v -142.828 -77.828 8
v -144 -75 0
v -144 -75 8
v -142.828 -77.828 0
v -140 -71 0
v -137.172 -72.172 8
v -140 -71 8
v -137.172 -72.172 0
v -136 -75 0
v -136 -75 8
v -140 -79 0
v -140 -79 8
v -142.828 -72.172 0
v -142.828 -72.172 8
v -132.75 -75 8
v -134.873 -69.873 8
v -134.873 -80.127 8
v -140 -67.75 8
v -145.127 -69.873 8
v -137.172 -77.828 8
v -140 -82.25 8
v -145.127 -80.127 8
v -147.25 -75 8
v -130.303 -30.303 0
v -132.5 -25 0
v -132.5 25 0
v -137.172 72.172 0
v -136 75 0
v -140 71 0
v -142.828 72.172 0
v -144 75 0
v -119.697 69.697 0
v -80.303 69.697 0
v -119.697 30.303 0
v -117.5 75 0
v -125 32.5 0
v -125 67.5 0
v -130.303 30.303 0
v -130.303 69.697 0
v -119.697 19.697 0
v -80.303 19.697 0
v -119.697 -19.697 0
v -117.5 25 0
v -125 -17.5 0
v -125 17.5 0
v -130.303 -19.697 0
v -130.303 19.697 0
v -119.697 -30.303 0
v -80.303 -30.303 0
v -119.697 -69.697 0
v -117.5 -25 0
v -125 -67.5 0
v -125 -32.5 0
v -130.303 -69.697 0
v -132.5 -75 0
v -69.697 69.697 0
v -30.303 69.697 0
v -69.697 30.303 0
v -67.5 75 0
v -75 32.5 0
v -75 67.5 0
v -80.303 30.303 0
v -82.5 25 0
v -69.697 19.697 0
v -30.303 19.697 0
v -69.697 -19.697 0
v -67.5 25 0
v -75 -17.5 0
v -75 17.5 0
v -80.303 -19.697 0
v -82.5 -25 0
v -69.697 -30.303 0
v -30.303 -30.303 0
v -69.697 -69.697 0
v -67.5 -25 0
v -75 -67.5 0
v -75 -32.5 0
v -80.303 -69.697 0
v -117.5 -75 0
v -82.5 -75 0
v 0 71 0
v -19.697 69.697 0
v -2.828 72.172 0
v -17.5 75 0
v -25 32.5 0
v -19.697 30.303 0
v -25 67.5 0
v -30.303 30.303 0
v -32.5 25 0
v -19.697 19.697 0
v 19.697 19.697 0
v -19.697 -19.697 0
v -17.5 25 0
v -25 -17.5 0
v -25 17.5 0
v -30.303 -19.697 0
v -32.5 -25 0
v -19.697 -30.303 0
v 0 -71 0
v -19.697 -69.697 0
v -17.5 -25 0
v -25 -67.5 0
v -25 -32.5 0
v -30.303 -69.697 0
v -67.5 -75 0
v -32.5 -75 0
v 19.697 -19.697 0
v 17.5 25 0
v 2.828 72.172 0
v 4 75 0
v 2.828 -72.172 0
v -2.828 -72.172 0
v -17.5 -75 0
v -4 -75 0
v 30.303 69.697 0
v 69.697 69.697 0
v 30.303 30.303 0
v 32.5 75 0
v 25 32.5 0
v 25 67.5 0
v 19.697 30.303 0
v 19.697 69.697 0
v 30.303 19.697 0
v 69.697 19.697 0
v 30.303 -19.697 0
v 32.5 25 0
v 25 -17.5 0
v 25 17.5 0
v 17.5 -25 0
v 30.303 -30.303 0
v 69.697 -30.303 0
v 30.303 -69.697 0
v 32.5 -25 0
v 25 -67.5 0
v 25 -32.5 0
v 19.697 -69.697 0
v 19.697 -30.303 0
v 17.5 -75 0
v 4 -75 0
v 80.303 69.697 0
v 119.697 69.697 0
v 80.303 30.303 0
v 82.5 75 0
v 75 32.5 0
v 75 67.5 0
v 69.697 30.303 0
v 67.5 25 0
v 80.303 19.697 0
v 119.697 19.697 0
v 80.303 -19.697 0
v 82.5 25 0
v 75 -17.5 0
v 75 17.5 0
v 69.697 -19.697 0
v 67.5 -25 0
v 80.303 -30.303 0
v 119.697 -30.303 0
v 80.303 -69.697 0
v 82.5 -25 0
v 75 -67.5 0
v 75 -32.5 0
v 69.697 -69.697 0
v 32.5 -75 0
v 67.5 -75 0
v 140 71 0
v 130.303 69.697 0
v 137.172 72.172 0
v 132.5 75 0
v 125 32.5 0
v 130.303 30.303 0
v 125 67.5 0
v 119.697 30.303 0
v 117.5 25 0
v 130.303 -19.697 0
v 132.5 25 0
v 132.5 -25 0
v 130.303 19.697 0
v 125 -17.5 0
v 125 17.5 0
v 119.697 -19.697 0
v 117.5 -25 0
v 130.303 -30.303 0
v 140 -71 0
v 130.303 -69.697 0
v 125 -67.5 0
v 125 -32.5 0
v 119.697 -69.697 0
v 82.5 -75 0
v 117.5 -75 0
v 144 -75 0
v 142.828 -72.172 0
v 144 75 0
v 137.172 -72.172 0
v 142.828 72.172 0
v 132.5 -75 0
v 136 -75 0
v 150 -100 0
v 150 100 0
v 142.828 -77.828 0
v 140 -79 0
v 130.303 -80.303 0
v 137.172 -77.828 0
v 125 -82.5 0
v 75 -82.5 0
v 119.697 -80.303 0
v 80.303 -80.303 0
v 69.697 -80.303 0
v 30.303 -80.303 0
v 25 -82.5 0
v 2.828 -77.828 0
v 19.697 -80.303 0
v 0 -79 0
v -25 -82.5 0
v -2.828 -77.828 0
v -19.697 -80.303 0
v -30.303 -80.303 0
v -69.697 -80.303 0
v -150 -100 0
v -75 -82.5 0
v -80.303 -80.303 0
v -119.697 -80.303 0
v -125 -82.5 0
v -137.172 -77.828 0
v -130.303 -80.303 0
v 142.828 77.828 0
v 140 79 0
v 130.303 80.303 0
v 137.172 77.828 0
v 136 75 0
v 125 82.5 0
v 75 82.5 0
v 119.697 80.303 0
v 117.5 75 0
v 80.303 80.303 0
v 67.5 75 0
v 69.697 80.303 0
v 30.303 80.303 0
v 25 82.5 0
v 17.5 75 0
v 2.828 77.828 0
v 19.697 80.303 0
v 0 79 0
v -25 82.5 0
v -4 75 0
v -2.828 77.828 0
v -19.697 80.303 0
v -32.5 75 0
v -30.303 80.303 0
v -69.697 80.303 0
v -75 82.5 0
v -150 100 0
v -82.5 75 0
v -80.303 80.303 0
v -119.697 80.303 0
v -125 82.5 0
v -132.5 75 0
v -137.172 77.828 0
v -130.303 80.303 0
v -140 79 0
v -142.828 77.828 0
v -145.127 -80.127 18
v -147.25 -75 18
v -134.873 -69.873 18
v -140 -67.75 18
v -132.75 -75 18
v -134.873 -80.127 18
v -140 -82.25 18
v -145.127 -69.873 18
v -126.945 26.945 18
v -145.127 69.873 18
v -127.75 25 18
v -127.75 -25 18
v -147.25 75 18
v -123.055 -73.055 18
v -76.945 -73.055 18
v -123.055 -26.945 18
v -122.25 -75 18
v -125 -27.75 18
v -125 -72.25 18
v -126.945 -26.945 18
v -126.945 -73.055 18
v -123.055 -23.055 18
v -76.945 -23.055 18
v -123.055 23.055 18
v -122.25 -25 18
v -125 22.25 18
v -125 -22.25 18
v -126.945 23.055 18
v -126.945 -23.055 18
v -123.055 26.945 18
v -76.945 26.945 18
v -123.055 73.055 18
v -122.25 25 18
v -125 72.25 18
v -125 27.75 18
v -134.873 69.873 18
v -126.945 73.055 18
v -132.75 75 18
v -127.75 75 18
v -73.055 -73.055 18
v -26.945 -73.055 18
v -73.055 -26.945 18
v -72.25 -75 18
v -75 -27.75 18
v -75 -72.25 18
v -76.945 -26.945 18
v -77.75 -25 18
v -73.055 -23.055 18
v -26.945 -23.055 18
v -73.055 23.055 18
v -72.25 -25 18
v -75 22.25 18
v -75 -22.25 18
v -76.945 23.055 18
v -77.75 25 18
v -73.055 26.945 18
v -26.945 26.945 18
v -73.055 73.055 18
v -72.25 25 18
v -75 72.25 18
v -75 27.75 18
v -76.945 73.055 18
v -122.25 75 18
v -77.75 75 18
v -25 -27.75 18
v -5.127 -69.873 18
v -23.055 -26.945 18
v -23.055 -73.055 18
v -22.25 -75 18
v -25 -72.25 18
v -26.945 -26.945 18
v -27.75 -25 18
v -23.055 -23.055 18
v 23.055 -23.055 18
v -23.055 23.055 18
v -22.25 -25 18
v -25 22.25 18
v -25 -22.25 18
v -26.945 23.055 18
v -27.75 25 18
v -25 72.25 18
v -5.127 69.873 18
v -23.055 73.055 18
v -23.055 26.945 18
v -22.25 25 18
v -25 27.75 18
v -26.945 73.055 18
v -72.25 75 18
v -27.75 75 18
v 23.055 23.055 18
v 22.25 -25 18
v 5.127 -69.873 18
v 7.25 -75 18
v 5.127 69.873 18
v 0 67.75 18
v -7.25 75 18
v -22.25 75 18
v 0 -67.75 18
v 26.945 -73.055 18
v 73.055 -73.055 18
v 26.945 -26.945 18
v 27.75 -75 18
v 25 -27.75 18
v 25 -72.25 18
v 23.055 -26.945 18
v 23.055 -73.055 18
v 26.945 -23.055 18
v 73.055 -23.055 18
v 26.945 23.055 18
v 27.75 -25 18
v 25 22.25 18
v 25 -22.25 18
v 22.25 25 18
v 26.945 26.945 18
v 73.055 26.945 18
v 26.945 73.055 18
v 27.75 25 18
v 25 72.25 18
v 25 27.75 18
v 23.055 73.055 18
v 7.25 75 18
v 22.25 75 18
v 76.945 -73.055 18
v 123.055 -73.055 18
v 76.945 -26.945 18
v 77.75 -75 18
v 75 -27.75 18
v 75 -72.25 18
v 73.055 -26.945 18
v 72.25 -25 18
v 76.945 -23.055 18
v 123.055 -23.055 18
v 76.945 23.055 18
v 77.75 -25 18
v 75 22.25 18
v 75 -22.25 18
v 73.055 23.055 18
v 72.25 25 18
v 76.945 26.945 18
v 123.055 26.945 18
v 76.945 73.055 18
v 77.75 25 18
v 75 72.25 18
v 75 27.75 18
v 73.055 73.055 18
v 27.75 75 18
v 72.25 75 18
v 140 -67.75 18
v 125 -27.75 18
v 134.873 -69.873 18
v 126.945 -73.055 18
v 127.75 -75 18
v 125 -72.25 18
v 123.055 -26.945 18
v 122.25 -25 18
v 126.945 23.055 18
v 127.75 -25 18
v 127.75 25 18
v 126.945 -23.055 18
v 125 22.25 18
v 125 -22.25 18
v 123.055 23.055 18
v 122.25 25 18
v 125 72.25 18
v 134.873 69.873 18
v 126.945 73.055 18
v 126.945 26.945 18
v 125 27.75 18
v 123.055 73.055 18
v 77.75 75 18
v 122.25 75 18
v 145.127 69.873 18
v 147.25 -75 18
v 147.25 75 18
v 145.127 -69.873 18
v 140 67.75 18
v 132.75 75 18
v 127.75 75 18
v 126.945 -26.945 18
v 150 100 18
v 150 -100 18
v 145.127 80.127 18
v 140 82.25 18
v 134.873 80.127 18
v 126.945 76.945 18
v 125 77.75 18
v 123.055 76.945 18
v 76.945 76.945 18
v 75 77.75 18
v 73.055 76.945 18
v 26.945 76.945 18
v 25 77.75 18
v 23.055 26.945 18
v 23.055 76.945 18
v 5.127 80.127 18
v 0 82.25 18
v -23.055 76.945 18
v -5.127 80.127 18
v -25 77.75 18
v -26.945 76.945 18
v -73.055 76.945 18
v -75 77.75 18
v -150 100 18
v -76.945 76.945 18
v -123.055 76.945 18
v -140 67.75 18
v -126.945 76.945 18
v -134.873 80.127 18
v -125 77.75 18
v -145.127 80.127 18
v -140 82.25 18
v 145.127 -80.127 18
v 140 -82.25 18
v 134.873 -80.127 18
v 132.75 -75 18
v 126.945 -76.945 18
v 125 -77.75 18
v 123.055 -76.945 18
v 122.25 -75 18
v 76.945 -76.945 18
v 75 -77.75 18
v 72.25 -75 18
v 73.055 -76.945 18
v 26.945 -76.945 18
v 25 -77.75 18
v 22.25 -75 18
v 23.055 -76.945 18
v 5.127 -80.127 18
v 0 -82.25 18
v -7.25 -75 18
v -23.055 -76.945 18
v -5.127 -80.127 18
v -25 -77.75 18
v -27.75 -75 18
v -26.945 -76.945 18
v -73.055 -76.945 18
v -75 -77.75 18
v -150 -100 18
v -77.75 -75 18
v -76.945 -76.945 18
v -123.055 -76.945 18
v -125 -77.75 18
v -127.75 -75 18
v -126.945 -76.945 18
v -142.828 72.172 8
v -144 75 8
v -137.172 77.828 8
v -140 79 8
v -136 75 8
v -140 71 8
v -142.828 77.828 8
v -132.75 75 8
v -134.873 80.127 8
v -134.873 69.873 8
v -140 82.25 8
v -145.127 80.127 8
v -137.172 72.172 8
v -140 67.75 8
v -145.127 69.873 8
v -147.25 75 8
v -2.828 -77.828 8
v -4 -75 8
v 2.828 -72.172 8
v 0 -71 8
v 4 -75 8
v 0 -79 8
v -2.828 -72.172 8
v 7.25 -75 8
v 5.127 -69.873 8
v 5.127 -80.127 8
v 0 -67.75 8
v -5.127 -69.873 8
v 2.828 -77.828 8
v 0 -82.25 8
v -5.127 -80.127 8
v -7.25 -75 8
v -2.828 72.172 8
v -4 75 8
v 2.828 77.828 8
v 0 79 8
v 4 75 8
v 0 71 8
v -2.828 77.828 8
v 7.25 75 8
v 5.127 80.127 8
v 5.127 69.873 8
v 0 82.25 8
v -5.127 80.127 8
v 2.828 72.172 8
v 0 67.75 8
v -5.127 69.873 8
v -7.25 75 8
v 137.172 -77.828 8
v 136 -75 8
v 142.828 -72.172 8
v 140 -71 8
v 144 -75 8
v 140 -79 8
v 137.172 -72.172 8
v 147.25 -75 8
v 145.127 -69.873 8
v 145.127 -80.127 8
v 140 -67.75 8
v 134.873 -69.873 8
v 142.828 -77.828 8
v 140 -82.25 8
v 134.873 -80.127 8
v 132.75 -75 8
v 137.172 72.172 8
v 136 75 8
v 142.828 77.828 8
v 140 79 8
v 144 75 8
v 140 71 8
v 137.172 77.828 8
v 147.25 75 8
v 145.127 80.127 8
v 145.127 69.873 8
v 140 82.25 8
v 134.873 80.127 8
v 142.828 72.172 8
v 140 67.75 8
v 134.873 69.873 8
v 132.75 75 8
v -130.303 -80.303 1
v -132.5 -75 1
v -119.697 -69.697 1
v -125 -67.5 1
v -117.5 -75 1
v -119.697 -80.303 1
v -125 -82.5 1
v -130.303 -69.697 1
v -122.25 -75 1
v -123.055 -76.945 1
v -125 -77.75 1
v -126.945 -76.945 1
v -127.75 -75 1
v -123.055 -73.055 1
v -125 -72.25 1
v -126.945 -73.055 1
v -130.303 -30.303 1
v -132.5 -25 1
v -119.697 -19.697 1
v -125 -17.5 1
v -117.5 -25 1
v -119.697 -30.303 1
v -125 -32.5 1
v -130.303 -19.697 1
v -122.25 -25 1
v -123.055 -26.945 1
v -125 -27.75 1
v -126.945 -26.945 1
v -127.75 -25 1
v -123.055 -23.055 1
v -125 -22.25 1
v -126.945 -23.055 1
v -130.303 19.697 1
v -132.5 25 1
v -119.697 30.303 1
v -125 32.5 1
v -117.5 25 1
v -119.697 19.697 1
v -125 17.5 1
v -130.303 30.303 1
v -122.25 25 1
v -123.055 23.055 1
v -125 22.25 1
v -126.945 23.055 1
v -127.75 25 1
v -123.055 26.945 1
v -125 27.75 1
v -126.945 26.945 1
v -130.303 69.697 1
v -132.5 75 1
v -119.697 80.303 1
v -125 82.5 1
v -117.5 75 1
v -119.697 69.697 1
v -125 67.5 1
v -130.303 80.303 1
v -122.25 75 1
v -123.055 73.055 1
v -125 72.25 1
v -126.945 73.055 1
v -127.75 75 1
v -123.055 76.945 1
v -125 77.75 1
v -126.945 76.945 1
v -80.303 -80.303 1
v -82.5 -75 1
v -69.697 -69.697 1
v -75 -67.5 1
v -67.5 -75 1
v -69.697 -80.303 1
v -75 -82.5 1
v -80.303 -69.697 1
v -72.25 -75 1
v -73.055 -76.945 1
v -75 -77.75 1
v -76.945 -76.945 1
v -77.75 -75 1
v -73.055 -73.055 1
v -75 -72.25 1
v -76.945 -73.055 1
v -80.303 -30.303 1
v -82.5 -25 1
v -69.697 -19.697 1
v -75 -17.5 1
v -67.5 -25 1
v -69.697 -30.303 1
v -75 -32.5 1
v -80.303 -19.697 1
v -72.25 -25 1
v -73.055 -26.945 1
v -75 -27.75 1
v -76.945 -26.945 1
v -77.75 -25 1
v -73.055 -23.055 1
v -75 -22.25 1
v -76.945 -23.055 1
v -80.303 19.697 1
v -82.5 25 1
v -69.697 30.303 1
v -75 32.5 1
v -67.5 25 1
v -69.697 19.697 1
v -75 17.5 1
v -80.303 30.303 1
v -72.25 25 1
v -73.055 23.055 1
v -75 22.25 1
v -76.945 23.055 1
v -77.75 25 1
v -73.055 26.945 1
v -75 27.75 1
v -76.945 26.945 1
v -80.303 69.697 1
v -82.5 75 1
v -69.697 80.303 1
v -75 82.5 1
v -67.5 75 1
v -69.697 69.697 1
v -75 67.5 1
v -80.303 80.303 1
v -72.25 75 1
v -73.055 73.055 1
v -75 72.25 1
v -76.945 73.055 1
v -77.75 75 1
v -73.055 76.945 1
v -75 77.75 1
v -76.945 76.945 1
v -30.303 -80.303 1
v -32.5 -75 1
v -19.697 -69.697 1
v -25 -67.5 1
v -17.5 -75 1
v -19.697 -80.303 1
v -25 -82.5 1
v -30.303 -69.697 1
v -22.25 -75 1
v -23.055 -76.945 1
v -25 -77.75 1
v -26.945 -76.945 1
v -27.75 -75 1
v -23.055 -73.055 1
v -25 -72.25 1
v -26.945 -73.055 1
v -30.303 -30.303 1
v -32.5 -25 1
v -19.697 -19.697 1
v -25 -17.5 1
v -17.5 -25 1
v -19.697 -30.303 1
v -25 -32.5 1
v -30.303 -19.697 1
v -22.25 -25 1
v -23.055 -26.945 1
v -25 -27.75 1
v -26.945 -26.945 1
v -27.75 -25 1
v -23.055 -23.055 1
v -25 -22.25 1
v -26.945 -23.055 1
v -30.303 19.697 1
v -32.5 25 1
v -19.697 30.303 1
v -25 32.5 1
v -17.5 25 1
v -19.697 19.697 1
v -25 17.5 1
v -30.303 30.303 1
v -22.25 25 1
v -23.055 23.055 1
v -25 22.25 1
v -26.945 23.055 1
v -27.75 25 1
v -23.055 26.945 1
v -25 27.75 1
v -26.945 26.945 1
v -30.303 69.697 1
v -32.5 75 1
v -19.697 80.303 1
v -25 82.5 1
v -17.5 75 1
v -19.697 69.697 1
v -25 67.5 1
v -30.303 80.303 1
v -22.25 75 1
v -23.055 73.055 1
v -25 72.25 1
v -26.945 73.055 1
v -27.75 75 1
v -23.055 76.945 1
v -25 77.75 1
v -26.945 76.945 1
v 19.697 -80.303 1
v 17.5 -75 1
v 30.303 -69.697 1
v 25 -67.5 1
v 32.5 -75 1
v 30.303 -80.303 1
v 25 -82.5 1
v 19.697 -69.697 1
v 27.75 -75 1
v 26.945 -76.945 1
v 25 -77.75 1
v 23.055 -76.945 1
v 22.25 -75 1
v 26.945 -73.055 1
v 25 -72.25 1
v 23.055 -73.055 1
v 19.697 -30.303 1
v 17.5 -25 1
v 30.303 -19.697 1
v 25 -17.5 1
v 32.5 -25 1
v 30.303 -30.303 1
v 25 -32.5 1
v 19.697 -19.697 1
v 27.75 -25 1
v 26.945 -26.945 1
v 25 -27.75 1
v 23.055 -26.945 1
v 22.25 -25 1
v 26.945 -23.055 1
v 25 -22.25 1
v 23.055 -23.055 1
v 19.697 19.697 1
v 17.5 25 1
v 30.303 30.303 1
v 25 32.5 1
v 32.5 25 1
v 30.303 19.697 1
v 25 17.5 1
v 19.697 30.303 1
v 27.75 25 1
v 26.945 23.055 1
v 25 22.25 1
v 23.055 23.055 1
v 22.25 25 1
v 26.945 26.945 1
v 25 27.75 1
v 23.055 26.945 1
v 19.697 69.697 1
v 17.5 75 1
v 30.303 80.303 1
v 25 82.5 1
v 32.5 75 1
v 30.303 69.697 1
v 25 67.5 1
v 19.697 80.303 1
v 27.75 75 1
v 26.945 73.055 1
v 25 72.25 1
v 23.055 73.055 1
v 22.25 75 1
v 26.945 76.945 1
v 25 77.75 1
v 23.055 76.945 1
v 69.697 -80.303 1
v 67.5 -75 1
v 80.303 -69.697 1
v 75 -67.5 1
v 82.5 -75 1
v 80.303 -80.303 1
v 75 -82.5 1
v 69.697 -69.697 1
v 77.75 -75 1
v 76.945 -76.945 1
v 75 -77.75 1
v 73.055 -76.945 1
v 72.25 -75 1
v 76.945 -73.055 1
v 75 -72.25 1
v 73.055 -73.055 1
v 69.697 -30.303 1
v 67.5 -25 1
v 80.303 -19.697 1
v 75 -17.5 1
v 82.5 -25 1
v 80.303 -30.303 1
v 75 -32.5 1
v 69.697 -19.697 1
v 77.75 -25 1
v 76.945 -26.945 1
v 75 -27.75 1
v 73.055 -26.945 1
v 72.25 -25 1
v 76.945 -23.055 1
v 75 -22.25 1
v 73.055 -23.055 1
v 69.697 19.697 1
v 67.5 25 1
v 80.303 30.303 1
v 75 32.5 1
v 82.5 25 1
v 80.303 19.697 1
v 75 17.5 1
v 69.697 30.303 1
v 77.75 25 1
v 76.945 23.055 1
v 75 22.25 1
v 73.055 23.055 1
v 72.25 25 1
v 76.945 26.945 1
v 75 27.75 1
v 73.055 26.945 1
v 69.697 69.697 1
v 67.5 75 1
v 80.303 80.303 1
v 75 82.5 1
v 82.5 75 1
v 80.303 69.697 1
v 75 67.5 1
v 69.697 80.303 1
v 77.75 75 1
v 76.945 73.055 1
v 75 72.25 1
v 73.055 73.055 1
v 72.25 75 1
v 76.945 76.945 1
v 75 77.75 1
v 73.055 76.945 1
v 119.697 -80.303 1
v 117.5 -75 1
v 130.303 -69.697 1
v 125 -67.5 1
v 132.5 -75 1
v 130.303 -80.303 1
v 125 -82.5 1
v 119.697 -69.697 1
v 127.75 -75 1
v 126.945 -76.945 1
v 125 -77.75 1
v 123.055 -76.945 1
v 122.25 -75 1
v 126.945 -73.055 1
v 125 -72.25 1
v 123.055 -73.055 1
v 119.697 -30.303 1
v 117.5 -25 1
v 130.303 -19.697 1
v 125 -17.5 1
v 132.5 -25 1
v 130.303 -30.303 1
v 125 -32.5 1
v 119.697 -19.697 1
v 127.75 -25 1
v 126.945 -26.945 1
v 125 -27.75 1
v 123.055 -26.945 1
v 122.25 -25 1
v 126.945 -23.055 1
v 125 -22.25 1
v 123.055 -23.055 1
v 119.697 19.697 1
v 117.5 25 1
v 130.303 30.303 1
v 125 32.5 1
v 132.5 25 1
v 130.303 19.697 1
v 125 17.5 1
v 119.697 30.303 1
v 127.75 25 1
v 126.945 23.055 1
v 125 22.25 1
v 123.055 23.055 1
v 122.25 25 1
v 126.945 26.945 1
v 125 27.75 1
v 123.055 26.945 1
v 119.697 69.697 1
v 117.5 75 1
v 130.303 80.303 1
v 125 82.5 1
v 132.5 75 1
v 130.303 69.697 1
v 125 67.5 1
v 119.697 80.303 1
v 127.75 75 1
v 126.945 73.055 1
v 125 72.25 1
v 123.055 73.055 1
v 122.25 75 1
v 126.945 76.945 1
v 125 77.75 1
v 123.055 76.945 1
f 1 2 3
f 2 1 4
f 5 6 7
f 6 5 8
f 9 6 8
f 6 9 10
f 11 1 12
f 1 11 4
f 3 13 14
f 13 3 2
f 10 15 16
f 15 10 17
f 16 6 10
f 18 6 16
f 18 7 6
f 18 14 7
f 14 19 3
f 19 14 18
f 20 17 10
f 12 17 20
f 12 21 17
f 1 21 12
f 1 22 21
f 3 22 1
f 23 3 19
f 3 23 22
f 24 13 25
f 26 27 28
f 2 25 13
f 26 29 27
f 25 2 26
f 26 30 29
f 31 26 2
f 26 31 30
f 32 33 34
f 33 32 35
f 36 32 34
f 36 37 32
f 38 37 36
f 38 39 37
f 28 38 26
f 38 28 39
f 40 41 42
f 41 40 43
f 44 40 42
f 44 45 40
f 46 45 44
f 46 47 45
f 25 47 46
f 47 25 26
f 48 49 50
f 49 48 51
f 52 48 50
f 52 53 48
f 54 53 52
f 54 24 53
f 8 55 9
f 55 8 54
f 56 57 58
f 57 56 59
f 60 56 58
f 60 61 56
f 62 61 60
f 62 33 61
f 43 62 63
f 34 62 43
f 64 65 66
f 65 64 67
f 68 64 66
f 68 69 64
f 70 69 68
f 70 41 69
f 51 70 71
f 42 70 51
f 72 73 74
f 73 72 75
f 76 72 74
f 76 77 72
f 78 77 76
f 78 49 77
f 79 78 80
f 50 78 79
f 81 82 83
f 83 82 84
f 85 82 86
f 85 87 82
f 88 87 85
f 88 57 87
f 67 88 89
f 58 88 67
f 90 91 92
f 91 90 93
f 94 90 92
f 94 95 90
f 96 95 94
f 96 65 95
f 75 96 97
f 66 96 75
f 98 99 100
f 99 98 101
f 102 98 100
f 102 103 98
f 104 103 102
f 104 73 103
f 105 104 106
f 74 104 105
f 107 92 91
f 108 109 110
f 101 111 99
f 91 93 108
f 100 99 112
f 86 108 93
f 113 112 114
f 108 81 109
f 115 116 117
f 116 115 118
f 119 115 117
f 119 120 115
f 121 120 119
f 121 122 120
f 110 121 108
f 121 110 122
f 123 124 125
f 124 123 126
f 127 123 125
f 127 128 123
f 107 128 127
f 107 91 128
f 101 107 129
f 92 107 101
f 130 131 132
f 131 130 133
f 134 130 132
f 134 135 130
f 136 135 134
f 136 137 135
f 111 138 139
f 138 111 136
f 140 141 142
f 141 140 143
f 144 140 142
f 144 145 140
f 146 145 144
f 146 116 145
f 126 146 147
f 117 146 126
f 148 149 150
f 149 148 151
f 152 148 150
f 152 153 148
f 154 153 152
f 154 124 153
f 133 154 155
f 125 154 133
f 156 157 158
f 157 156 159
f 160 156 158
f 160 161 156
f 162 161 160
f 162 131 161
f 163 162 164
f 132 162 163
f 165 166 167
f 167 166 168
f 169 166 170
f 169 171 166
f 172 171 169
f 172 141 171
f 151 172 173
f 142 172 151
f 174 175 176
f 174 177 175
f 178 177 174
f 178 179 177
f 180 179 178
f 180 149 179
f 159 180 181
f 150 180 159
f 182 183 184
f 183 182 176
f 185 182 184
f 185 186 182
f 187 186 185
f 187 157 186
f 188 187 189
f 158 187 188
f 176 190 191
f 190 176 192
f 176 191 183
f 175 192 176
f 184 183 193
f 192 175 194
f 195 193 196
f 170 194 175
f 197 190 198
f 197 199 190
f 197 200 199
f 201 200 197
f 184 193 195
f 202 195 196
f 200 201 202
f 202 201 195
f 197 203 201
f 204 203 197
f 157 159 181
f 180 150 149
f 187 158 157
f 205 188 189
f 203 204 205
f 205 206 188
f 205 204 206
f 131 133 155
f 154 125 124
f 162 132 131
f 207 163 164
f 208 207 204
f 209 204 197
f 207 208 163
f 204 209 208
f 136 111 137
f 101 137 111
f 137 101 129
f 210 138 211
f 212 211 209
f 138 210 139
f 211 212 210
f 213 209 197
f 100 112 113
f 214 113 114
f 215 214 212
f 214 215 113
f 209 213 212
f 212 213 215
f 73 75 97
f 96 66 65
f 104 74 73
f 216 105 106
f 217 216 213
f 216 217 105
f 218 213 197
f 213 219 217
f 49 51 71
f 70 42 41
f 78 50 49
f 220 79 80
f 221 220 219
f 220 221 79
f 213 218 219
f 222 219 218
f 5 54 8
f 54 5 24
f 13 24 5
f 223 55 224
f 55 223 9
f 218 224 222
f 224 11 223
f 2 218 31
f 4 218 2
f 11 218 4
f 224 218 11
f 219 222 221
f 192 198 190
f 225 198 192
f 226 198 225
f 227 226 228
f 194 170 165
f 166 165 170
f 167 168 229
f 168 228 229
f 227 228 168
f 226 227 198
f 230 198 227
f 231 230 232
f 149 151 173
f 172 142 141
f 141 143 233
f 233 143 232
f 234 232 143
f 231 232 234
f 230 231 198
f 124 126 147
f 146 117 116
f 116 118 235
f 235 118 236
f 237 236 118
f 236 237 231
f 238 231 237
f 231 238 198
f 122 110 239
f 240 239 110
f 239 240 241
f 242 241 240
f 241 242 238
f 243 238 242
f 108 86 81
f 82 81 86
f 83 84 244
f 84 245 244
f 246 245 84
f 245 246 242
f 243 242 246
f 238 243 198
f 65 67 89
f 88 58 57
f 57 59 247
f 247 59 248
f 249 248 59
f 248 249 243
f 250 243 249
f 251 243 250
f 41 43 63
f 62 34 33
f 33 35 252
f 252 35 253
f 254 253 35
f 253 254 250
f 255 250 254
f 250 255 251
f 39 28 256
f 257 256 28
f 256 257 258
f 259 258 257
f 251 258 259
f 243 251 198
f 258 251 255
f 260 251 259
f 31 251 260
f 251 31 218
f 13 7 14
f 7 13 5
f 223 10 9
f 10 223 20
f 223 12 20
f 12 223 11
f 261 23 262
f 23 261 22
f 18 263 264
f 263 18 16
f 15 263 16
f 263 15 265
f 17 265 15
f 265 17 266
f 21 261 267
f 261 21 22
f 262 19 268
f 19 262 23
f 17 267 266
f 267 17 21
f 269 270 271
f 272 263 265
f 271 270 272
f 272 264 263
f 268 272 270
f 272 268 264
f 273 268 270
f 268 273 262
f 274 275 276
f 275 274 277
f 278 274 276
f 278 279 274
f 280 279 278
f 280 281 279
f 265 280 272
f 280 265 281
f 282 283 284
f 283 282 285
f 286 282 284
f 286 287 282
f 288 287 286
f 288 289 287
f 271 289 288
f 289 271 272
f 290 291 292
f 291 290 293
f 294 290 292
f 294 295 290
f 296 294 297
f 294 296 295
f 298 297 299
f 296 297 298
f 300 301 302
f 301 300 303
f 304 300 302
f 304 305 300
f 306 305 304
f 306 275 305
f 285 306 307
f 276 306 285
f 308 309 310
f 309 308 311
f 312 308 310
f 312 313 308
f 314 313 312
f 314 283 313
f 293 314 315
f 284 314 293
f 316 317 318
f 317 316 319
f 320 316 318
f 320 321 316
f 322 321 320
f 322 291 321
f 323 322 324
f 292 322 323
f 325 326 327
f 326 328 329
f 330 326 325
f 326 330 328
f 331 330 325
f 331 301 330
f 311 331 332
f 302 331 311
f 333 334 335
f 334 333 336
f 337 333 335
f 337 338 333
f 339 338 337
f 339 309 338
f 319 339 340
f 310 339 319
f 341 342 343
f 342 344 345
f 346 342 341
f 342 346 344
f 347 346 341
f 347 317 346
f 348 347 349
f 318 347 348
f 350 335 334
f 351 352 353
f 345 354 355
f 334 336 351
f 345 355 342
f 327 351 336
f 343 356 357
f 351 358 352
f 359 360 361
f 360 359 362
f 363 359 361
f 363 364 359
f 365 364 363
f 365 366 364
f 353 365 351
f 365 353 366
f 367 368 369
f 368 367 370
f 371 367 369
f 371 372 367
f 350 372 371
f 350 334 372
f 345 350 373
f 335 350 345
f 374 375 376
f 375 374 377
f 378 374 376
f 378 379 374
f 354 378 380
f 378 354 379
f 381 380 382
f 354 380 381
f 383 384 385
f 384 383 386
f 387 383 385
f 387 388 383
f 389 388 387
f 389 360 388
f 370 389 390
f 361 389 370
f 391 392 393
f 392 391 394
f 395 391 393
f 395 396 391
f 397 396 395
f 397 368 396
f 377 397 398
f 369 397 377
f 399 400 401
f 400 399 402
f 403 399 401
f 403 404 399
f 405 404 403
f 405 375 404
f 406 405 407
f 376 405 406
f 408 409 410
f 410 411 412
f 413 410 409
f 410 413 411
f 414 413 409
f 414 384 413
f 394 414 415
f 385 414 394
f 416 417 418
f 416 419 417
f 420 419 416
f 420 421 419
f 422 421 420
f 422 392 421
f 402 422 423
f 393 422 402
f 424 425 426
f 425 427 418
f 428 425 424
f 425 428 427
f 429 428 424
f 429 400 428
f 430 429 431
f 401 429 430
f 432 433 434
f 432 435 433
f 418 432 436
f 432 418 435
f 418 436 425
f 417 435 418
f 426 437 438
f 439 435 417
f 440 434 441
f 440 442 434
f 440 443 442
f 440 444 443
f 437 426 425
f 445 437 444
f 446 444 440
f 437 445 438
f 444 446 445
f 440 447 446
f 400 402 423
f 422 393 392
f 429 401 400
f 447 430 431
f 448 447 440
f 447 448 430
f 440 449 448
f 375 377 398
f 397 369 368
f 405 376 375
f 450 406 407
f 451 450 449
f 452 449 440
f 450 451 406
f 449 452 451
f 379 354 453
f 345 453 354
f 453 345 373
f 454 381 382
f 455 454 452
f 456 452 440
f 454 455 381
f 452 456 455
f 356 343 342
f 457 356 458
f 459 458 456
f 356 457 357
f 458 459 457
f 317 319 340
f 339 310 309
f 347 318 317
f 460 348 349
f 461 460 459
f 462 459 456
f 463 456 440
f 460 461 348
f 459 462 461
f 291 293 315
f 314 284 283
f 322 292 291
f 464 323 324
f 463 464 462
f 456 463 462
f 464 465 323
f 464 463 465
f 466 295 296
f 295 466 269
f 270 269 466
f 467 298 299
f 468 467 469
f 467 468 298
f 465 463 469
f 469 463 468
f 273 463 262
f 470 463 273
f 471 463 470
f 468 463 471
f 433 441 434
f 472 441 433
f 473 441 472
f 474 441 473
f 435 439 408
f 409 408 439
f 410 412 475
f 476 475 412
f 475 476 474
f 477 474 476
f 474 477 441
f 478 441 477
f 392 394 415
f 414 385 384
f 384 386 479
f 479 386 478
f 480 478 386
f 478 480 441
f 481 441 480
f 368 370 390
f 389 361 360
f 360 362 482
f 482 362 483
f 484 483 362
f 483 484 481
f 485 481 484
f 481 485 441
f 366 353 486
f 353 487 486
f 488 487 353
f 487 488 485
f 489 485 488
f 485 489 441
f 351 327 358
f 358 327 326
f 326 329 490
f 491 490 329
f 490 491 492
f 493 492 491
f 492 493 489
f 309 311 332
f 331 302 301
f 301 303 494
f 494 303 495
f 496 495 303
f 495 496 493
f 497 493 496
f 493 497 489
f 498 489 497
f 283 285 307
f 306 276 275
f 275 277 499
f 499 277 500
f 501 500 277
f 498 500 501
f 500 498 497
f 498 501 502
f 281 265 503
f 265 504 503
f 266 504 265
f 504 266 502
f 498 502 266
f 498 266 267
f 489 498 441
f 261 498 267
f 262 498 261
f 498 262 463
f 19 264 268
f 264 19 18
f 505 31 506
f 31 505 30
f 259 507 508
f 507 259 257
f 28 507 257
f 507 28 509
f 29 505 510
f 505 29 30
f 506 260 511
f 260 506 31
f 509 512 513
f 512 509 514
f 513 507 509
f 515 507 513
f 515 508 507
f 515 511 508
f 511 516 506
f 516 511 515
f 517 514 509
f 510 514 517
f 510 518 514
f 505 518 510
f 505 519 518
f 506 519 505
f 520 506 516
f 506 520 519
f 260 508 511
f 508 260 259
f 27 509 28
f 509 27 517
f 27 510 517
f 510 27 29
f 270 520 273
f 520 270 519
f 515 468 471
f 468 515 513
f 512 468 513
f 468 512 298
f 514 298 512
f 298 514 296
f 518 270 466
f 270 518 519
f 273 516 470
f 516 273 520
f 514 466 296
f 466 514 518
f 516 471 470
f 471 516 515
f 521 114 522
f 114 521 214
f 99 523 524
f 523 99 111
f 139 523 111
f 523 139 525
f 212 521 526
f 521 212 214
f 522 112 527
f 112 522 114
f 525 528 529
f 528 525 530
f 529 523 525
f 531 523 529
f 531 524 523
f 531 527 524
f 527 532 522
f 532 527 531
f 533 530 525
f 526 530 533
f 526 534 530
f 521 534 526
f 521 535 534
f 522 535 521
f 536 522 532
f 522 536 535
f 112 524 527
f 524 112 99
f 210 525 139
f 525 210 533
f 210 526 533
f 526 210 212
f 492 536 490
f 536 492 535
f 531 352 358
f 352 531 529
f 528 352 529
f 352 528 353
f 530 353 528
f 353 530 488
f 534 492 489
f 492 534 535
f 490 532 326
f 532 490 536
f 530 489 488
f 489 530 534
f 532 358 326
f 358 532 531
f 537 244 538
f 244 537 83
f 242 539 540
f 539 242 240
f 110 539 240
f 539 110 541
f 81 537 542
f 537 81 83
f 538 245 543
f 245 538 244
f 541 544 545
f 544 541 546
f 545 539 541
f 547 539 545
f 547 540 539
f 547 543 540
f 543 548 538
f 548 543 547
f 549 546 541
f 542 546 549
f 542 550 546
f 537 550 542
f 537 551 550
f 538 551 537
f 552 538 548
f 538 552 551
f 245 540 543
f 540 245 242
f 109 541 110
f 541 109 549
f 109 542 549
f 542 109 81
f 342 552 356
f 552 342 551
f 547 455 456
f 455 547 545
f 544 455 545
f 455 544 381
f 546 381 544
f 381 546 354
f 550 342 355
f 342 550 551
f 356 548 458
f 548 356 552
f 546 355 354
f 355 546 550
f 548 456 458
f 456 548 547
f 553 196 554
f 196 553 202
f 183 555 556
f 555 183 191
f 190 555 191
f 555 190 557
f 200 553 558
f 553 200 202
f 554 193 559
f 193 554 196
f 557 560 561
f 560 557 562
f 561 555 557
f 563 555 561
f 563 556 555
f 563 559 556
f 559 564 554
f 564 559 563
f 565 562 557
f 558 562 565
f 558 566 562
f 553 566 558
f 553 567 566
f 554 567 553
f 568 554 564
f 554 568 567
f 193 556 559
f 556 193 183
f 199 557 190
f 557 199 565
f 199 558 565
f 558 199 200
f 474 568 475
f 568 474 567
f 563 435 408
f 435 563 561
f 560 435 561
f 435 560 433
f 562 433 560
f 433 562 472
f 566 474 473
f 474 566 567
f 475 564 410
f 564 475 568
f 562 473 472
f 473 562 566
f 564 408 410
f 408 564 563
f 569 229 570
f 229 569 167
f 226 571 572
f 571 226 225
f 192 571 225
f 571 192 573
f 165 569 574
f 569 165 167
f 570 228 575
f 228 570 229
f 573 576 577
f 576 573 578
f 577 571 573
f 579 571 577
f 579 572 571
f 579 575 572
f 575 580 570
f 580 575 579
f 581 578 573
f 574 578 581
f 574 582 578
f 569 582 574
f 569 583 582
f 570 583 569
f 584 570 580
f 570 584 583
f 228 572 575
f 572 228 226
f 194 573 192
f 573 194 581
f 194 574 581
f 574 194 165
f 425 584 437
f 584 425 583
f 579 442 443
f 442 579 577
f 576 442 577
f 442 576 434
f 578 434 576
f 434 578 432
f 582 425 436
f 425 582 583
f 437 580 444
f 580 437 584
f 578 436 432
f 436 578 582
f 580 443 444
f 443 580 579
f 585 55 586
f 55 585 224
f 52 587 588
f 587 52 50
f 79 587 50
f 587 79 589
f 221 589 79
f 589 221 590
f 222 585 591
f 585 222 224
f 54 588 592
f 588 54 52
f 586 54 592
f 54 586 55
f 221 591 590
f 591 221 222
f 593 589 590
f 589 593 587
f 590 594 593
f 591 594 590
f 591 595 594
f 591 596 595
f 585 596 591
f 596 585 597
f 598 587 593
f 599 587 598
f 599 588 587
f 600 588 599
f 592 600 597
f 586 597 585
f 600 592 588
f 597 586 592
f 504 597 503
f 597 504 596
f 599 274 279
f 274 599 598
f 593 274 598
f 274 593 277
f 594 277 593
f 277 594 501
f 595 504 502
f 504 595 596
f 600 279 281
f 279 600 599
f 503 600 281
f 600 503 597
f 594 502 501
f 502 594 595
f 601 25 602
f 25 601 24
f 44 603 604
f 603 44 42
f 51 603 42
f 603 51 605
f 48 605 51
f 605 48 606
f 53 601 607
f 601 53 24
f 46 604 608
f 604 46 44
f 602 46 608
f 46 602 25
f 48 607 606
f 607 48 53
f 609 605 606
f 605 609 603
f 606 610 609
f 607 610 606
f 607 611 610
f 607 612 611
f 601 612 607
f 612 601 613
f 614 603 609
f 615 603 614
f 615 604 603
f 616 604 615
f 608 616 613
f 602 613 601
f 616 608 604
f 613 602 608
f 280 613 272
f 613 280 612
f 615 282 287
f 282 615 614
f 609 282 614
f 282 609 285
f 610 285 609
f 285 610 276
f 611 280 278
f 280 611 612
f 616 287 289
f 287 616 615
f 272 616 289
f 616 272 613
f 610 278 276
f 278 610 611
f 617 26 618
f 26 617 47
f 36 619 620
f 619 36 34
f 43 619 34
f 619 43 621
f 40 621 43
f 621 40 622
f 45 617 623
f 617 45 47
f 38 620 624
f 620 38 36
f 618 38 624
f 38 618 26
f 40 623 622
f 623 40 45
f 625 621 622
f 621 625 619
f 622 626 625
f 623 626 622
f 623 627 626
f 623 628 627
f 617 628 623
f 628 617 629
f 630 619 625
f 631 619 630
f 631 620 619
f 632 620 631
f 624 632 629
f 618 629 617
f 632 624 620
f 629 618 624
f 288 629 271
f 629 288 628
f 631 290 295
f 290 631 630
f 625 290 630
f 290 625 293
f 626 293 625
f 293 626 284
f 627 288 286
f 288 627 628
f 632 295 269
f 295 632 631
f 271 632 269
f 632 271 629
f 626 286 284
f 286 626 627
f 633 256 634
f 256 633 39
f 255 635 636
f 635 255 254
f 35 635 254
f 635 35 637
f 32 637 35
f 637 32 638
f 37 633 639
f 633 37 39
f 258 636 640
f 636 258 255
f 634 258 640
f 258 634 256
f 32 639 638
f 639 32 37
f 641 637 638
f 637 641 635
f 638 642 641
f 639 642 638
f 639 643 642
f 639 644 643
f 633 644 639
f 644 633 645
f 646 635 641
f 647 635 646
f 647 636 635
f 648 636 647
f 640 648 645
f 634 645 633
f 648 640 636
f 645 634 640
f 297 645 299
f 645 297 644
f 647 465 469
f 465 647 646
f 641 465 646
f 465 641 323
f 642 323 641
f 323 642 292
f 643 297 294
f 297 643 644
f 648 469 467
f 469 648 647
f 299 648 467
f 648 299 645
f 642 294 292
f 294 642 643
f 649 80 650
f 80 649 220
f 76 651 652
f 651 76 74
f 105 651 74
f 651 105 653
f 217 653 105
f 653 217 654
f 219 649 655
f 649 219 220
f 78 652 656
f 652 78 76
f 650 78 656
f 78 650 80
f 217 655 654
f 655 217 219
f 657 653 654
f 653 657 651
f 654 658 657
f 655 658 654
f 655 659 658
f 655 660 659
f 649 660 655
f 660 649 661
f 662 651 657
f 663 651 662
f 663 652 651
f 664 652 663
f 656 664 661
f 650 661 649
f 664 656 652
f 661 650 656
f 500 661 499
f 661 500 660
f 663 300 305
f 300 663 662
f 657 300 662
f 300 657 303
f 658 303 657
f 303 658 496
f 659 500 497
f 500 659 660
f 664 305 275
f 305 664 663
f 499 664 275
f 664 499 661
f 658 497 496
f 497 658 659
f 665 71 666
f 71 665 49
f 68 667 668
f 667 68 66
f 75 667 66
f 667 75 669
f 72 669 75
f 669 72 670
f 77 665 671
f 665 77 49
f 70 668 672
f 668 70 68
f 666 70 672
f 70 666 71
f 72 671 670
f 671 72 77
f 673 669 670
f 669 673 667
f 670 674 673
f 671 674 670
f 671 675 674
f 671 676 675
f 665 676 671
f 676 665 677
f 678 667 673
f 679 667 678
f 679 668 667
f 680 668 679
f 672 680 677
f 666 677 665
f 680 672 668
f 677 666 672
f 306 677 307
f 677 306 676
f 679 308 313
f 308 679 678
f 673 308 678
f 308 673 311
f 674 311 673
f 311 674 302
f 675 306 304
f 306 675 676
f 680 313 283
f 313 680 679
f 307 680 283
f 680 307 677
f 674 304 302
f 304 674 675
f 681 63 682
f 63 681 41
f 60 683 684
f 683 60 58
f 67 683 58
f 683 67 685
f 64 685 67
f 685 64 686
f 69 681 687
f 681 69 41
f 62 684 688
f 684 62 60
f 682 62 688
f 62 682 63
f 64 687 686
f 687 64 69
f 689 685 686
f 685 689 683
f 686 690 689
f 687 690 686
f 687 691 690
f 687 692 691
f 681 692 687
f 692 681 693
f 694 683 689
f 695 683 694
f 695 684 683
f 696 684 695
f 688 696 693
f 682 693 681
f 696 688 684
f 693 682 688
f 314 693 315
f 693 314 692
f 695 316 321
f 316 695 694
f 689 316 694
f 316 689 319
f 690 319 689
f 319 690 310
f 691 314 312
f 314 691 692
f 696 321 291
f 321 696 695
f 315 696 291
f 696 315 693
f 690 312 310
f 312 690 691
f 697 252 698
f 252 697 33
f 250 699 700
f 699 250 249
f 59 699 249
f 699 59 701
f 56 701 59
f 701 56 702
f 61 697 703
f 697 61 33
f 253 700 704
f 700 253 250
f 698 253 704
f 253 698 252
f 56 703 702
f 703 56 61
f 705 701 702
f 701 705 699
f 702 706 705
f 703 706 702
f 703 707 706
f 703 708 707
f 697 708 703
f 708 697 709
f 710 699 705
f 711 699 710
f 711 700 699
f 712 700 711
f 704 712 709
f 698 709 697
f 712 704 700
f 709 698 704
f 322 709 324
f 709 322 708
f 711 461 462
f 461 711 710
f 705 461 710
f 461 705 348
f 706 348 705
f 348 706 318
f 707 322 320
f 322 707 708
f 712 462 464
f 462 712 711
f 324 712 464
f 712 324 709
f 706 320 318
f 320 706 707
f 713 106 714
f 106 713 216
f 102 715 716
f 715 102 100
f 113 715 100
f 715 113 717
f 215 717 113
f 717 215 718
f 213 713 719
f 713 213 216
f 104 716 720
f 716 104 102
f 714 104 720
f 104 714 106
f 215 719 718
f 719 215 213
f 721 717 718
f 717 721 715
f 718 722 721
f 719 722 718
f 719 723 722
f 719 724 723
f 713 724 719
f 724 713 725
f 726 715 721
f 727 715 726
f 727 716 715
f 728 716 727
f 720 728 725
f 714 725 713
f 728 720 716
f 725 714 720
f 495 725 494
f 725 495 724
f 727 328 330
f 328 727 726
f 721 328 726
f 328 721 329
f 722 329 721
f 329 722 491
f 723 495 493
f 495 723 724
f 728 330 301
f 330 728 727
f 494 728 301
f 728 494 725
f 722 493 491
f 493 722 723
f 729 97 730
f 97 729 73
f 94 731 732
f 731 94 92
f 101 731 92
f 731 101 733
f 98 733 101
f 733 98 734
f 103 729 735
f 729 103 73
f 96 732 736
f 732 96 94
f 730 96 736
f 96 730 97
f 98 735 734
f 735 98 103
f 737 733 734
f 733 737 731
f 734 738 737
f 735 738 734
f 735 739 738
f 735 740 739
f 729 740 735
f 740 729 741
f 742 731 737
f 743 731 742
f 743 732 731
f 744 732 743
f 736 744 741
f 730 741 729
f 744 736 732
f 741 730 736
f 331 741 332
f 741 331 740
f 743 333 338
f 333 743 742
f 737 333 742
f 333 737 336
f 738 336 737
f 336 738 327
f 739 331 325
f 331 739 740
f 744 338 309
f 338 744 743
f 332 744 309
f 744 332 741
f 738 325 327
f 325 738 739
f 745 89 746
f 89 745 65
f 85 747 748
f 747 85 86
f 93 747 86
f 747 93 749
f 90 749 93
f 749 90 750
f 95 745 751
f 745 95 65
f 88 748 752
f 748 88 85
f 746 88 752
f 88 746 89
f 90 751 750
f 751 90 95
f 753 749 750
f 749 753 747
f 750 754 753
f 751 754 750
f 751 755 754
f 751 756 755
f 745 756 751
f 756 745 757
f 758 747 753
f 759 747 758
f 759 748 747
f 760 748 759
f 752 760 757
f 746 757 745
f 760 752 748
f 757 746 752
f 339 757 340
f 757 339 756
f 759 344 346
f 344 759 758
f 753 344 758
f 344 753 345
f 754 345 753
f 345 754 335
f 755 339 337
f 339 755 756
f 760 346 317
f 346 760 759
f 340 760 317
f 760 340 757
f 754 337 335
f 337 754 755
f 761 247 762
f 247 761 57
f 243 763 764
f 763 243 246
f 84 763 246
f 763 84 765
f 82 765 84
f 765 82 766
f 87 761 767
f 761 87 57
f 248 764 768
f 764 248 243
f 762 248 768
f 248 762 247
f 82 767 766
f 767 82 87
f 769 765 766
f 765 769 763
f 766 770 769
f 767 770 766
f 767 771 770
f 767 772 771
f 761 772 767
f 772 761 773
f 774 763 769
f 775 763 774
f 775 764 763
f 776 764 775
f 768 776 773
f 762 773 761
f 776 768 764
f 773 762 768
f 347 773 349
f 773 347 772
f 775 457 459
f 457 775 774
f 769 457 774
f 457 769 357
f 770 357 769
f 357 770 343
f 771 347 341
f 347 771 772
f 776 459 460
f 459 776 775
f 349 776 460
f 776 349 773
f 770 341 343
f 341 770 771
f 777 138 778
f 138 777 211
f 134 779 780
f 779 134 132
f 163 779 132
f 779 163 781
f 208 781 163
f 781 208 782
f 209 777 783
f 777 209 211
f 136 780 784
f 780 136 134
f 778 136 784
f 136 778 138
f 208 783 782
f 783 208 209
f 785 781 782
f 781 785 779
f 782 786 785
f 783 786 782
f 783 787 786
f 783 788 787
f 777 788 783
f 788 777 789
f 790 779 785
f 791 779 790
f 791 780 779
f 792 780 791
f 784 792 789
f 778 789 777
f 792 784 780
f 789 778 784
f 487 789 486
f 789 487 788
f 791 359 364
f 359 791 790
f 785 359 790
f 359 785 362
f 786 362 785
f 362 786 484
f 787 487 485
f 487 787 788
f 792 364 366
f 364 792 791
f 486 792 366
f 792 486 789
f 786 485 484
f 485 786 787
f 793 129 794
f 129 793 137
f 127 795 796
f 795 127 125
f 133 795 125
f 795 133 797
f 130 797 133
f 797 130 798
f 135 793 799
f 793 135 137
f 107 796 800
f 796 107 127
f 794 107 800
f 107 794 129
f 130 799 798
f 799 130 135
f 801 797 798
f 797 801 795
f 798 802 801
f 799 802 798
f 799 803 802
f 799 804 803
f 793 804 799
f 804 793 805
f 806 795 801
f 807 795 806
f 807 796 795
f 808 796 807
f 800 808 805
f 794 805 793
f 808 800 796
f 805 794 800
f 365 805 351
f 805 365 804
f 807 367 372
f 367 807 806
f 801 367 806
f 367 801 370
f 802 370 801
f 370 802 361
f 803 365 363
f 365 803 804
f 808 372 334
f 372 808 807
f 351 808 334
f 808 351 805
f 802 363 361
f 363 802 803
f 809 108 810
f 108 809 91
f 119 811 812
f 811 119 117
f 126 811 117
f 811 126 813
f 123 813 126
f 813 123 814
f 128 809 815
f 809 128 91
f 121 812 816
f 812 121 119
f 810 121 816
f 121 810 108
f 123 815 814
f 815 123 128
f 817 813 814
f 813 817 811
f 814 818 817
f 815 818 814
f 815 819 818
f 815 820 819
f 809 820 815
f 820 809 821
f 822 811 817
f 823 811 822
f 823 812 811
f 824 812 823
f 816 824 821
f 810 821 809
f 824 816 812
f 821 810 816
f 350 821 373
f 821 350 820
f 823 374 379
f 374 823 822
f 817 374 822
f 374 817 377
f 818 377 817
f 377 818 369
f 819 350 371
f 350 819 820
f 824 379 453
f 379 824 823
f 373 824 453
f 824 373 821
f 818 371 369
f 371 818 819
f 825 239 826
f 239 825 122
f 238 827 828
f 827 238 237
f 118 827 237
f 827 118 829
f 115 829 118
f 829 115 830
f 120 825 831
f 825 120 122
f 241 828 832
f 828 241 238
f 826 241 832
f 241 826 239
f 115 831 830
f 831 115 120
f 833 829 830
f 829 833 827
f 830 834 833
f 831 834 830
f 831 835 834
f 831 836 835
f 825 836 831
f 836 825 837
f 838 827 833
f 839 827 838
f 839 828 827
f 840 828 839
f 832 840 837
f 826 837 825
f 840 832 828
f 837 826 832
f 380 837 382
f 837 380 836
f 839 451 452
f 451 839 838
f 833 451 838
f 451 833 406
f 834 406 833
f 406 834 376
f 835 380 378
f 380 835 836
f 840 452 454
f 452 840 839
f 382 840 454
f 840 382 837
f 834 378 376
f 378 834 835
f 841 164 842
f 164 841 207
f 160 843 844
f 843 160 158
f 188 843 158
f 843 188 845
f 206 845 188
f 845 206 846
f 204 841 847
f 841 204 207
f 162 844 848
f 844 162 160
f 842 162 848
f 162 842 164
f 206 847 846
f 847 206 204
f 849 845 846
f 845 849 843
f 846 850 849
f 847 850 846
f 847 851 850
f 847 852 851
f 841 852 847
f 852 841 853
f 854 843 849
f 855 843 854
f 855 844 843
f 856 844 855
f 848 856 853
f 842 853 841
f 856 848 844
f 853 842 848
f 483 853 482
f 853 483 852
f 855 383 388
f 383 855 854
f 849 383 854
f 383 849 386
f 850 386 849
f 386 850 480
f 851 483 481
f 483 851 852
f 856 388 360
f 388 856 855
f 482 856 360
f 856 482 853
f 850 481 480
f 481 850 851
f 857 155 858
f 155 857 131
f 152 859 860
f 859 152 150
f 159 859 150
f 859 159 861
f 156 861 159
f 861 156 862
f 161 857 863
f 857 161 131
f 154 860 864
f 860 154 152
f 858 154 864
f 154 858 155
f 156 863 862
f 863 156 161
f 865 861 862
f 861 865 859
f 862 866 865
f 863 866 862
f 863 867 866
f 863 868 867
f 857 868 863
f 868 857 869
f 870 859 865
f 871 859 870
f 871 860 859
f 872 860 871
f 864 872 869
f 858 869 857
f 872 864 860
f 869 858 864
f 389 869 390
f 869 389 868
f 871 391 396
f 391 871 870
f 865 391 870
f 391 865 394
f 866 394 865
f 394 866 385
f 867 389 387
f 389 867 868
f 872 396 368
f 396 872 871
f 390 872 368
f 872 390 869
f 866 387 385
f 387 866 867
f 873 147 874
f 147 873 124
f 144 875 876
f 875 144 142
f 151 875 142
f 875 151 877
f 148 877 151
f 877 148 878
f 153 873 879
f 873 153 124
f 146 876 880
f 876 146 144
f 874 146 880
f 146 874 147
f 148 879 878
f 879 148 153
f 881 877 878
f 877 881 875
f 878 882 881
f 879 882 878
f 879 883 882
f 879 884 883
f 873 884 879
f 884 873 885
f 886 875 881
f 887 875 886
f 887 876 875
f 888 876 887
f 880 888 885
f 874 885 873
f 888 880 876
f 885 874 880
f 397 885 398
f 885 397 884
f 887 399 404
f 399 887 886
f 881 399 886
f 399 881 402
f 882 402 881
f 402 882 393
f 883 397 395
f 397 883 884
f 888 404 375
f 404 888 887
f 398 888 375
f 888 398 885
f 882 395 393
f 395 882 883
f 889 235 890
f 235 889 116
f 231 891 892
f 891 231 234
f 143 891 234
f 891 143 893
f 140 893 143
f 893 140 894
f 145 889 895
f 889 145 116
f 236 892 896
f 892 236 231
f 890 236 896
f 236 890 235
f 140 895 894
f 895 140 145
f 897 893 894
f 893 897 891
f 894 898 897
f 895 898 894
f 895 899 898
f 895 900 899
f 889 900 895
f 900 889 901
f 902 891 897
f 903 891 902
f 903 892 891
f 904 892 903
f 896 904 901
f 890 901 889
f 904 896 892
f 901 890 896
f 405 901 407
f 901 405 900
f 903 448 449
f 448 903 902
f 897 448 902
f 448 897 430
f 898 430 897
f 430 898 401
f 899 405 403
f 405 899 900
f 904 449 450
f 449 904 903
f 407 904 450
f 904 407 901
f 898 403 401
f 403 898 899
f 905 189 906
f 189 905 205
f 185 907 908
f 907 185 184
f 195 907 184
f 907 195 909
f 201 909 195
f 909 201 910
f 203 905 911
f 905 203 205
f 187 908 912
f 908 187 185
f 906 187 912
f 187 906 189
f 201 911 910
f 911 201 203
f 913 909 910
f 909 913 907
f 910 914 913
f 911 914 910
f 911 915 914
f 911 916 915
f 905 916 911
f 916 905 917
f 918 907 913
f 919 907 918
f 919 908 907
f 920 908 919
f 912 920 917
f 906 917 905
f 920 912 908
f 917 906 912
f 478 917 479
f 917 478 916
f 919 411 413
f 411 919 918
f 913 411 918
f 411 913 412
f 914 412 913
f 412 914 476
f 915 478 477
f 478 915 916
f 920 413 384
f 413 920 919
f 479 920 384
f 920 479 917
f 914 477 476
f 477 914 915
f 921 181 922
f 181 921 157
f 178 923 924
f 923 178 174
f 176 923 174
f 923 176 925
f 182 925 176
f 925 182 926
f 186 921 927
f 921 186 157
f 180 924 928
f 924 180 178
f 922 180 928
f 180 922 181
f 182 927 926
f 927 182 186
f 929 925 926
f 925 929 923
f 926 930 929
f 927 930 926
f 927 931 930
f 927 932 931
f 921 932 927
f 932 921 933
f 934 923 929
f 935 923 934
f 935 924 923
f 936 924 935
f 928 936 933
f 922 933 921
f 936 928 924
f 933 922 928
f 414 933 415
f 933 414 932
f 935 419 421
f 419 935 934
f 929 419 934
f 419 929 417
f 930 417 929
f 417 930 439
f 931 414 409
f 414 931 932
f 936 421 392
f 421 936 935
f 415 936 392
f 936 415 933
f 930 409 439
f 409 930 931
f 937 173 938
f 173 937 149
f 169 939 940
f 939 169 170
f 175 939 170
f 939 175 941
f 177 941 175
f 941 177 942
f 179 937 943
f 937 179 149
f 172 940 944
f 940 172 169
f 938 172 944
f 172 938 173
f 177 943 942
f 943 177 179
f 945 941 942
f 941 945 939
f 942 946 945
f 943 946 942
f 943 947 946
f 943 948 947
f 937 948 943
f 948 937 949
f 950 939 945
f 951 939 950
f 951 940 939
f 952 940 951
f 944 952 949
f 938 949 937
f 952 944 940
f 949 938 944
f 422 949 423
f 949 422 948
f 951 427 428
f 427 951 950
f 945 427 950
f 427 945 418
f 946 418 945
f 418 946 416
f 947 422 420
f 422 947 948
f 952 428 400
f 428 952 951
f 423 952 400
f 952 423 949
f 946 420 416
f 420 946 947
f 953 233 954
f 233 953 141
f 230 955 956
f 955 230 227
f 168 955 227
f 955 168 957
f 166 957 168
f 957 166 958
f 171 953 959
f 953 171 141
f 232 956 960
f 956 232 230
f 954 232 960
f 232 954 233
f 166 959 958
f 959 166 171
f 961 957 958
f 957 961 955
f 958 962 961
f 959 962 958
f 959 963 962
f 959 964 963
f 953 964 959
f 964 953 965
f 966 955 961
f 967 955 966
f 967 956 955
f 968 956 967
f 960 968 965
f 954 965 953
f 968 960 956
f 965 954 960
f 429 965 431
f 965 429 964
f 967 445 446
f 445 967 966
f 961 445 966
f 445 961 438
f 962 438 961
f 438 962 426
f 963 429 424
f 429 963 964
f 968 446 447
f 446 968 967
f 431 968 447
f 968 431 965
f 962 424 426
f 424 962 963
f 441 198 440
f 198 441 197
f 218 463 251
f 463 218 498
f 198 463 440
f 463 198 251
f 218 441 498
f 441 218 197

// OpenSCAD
// file: util.scad
// This function calculates the offset required to center equally spaced spaced series of "n objects. The objects have a length "x" and gap "g" between neighbouring objects. "l" is the length of the reference line.
function linearOffset (l, n, x, g) = (l - (n*x + (n-1)*g)) / 2;

// Calculating gaps between equally a series of equidistant objects of length "x" spanning across a reference line "l". There is an offset "o" at each side of the reference line.
function linearGap (l, n, x, o) = (l - 2*o - n*x) / (n - 1);
// file: variables.scad
include<util.scad>

$fn=8;


///////////////
// Wasteboard//
///////////////

clr = 5; // No metal area

// Mounting holes to the T slot worktop
// M8 nuts with TX40 heads are used. Adjust M_d2 and M_k as it might be different. 

M_pitch = 1.25;   // Pitch size (mm)
M_nd = 8.0;    // Nominal diameter (mm)
M_cd = 8.4;    // Clearance drill diameter (mm)
M_td = 9.0;    // Tap drill diameter (mm)

M_d2 = 14.5; ///// 12;     // Max bolt head diameter (mm)
M_k = 5; ///// 4.4;     // Max bolt head height (mm)


// Mounting holes for tool holders
// T-nut dimensions with M4 thread
;
tn_ch = 6;     // Cylinder height 
tn_cd = 5.5;     // Cylinder external diameter
tn_shh = 1.0;  // Shoulder height
tn_shd = 15;   // Shoulder diameter

wbh = 18; // Wasteboard height
mbh = wbh - (clr + M_k); // Minimum board height.
// file: modules.scad
include <variables.scad>

// Basic primitive for the worktop
module aluStock(l, w, h) {
    cube([l, w, h]);
}

// Assembling parts of the worktop
module carveyWorktop(l, w, h, n, g, tSlotOffset, tSlotDim ) {
    // Calculate the shift of the T-slots in the Y direction
    ytrans = tSlotOffset;
    // Calculate the height difference of the T-slot profile and the stock. 
    ztrans = h - (tSlotDim[1]+tSlotDim[3]);
    // Cutting the T-slot groves out of the stock
    translate([-l/2, -w/2, 0])
        difference() {
            aluStock(l, w, h);
            // Move extrusion up to stock surface and centre it along the Y direction
            translate([0, ytrans, ztrans])
                for (i = [0 : n - 1]) {
                    translate([0, i * (g + tSlotDim[0]), 0])
                        tSlotExtrusion(tSlotDim,l);                        
                }
       }
}

module tSlotExtrusion(dim,l){
/*
dim = [a, b, c, d]
    
a = headspace width
b = headspace depth
c = throat width
d = throat depth

Cut section diagram of the T-slot. 

+------------+     +-------------+
|            |     |   Λ         |
|            |<-e->|   |         |
|            |     |   d         |
|            |     |   |         |
|            |     |   V         |
|     +------+     +------+ ---  |
|     |                   |   Λ  |
|     |                   |   |  |
|     |                   |   b  |
|     |<--------a-------->|   |  |
|     |                   |   V  |
|     +-------------------+ ---  |
|                                |
+--------------------------------+


*/

    tSlotProfilePoints = [
        [0,                  0],
        [dim[0],             0],
        [dim[0],             dim[1]],
        [(dim[0]+dim[2])/2,  dim[1]],
        [(dim[0]+dim[2])/2,  dim[1]+dim[3]],
        [(dim[0]-dim[2])/2,  dim[1]+dim[3]],
        [(dim[0]-dim[2])/2,  dim[1]],
        [0,                  dim[1]]
        ];
    rotate([90, 0, 90]) {
        linear_extrude(l) {
            polygon(points = tSlotProfilePoints);
        }
    }
}

////////////////////
//// Wasteboard ////
////////////////////

module wasteBoard(l, w, h, mhVar, mhDim, tnhDim, tnhVar){
    //////
    // Variables for mounting holes
    //////
    // Finding the largest diameter of the mounting holes
    D = (mhDim[1] > mhDim[3]) ? mhDim[1] : mhDim[3];
    // Calculating the offset needed to center the mounting holes above the T-slots  
    mh_align =(mhVar[4] - D) / 2;
    // Gap between mounting holes along the X axis that allow the wasteboard to be fastened to the worktop
    gx = linearGap(l, mhVar[0], D, mhVar[2]);
    // Gap between mounting holes along the Y axis
    gy = linearGap(w, mhVar[1], mhVar[4], mhVar[3]);
    // Centering along the X and Y axes.
    //////
    // Variables for T-nut holes
    //////
    // Finding the largest diameter of the T-nut holes
    tnD = (tnhDim[0] > tnhDim[2]) ? tnhDim[0] : tnhDim[2];
    // Offset along X axis
    tn_xo = linearOffset(l, tnhVar[0], tnD, tnhVar[2]);
    // Offest along Y axis
    tn_yo = linearOffset(w, tnhVar[1], tnD, tnhVar[3]);

    translate([-l/2, -w/2, 0])
        difference() {
            mdfStock(l, w, h);
            //
            // Mounting holes
            //
            // Align the first hole body to be in x and y positive quadrant and applying offsets
            translate([D/2 + mhVar[2], D/2 + mhVar[3], 0])
            // Create the array of mounting holes
                for (i = [0 : mhVar[0] - 1]) {
                    for (j = [0 : mhVar[1] - 1]) {
                        if (mhVar[5] == true) {
                            if (j == 0 || j == mhVar[1] - 1) {
                                translate([i * (gx + D), j * (gy + mhVar[4]) + mh_align, 0])
                                dualDHole(mhDim);
                            } else{
                            }
                        } else {
                            translate([i * (gx + D), j * (gy + mhVar[4]) + mh_align, 0])
                            dualDHole(mhDim);
                        }
                    }   
                }
            //
            // T-nut holes
            //
            // Align the first hole body to be in x and y positive quadrant and applying offsets
            translate([tnD/2 + tn_xo, tnD/2 + tn_yo, 0])
            // Create the array of mounting holes
                for (i = [0 : tnhVar[0] - 1]) {
                    for (j = [0 : tnhVar[1] - 1]) {
                            translate([i*(tnD + tnhVar[2]),j*(tnD + tnhVar[3]),0])
                            dualDHole(tnhDim);
                        }
                    }
        }
}

module mdfStock(l, w, h){
    cube([l,w,h]);
}

module tNutHole(){
    dualDHole(tn_shd,tn_shh,tn_cd,wbh-tn_shh);
}

// The second cylinder is on top of the first.
module dualDHole(dim){

// dim = [ d1, h1, d2, h2]
    cylinder(h=dim[1],d=dim[0]);
    translate([0,0,dim[1]])
        cylinder(h=dim[3],d=dim[2]);
}
// main file
 include<modules.scad>

///////////////////////////
//// Customisable menu ////
///////////////////////////

/* [Worktop] */

// Worktop length (mm)
wtl = 300;
// Worktop width (mm)
wtw = 200;
// Worktop height (mm)
wth = 30;

/* [T-slot] */

// Number of slots
n_slots = 4;
// Headspace width (mm)
hsw = 16; //
// Headspace depth (mm)
hsd = 8; //
// Throat width (mm)
thw = 10; //
// Throat depth (mm)
thd = 8; //
// Gap between slots (mm)
tsg = 34;

/* [Wasteboard] */

// Wasteboard length (mm)
wbl = wtl;
// Wasteboard width (mm)
wbw = wtw;
// Wasteboard height (mm)
wbh = 18;
// Mounting holes count in X dir
mh_xn = 3; // [2:5]
// Mounting hole count in Y dir
mh_yn = 5; //// [2:2]
// Plot mounting holes only above outer T-slots
outerRowsOnly = true;
// Mounting hole X offset
mhx_offset = 05;

/* [Work in progress]  = */

tn_xn = 6;
tn_yn = 4;
tn_xg = 50;
tn_yg = 50;
tn_xo = linearOffset(wbl,tn_xn,0,tn_xg);
tn_yo = linearOffset(wbw,tn_yn,0,tn_yg);
//////////////////////////////
//// Calculated variables ////
//////////////////////////////

//Worktop
//
// T-slot dimensions
groveDim = [hsw, hsd, thw, thd]; 
// Offset value used to centre the T-slots
tso = linearOffset(wtw, n_slots, hsw, tsg);

// Wasteboard
//
// Mounting hole "Y" offset
mhy_offset = tso;

// Mounting hole variables
mountingHoleVar = [mh_xn, mh_yn, mhx_offset, mhy_offset, hsw, outerRowsOnly];

// Mounting hole dimensions
mountingHoleDim = [M_nd, mbh, M_d2, clr+M_k];

// T-nut hole dimensions
tNutHoleDim = [tn_shd, tn_shh, tn_cd, wbh-tn_shh]; 

// T-nut hole variables
tNutHoleVar = [tn_xn, tn_yn, tn_xg, tn_yg, tn_xo, tn_yo];
////////////////////
wasteBoard(wbl, wbw, wbh, mountingHoleVar, mountingHoleDim, tNutHoleDim, tNutHoleVar);

module wasteBoard(l, w, h, mhVar, mhDim, tnhDim, tnhVar){
    // Finding the largest diameter of the mounting holes
    D = (mhDim[1] > mhDim[3]) ? mhDim[1] : mhDim[3];
    // Calculating the offset needed to center the mounting holes above the T-slots  
    mh_align =(mhVar[4] - D) / 2;
    // Gap between mounting holes along the X axis that allow the wasteboard to be fastened to the worktop
    gx = linearGap(l, mhVar[0], D, mhVar[2]);
    // Gap between mounting holes along the Y axis
    gy = linearGap(w, mhVar[1], mhVar[4], mhVar[3]);
    // Centering along the X and Y axes.
    translate([-l/2, -w/2, 0])
        difference() {
            mdfStock(l, w, h);
            //
            // Mounting holes
            //
            // Align the first hole body to be in x and y positive quadrant and applying offsets
            translate([D/2 + mhVar[2], D/2 + mhVar[3], 0])
            // Create the array of mounting holes
                for (i = [0 : mhVar[0] - 1]) {
                    for (j = [0 : mhVar[1] - 1]) {
                        if (mhVar[5] == true) {
                            if (j == 0 || j == mhVar[1] - 1) {
                                translate([i * (gx + D), j * (gy + mhVar[4]) + mh_align, 0])
                                dualDHole(mhDim);
                            } else{
                            }
                        } else {
                            translate([i * (gx + D), j * (gy + mhVar[4]) + mh_align, 0])
                            dualDHole(mhDim);
                        }
                    }   
                }
    //
    // T-nut holes
    //
    // Finding the largest diameter of the T-nut holes
    tnD = (tnhDim[1] > tnhDim[3]) ? tnhDim[1] : tnhDim[3];
            // Mounting holes
            // Align the first hole body to be in x and y positive quadrant and applying offsets
            translate([tn_xo,tn_yo,0])
            // Create the array of mounting holes
                for (i = [0 : tnhVar[0] - 1]) {
                    for (j = [0 : tnhVar[1] - 1]) {
                            translate([i*tnhVar[2],j*tnhVar[3],0])
                            dualDHole(tnhDim);
                        }
                    }   
                }

}

module mdfStock(l, w, h){
    cube([l,w,h]);
}

// The second cylinder is on top of the first.
module dualDHole(dim){

// dim = [ d1, h1, d2, h2]
    cylinder(h=dim[1],d=dim[0]);
    translate([0,0,dim[1]])
        cylinder(h=dim[3],d=dim[2]);
}
